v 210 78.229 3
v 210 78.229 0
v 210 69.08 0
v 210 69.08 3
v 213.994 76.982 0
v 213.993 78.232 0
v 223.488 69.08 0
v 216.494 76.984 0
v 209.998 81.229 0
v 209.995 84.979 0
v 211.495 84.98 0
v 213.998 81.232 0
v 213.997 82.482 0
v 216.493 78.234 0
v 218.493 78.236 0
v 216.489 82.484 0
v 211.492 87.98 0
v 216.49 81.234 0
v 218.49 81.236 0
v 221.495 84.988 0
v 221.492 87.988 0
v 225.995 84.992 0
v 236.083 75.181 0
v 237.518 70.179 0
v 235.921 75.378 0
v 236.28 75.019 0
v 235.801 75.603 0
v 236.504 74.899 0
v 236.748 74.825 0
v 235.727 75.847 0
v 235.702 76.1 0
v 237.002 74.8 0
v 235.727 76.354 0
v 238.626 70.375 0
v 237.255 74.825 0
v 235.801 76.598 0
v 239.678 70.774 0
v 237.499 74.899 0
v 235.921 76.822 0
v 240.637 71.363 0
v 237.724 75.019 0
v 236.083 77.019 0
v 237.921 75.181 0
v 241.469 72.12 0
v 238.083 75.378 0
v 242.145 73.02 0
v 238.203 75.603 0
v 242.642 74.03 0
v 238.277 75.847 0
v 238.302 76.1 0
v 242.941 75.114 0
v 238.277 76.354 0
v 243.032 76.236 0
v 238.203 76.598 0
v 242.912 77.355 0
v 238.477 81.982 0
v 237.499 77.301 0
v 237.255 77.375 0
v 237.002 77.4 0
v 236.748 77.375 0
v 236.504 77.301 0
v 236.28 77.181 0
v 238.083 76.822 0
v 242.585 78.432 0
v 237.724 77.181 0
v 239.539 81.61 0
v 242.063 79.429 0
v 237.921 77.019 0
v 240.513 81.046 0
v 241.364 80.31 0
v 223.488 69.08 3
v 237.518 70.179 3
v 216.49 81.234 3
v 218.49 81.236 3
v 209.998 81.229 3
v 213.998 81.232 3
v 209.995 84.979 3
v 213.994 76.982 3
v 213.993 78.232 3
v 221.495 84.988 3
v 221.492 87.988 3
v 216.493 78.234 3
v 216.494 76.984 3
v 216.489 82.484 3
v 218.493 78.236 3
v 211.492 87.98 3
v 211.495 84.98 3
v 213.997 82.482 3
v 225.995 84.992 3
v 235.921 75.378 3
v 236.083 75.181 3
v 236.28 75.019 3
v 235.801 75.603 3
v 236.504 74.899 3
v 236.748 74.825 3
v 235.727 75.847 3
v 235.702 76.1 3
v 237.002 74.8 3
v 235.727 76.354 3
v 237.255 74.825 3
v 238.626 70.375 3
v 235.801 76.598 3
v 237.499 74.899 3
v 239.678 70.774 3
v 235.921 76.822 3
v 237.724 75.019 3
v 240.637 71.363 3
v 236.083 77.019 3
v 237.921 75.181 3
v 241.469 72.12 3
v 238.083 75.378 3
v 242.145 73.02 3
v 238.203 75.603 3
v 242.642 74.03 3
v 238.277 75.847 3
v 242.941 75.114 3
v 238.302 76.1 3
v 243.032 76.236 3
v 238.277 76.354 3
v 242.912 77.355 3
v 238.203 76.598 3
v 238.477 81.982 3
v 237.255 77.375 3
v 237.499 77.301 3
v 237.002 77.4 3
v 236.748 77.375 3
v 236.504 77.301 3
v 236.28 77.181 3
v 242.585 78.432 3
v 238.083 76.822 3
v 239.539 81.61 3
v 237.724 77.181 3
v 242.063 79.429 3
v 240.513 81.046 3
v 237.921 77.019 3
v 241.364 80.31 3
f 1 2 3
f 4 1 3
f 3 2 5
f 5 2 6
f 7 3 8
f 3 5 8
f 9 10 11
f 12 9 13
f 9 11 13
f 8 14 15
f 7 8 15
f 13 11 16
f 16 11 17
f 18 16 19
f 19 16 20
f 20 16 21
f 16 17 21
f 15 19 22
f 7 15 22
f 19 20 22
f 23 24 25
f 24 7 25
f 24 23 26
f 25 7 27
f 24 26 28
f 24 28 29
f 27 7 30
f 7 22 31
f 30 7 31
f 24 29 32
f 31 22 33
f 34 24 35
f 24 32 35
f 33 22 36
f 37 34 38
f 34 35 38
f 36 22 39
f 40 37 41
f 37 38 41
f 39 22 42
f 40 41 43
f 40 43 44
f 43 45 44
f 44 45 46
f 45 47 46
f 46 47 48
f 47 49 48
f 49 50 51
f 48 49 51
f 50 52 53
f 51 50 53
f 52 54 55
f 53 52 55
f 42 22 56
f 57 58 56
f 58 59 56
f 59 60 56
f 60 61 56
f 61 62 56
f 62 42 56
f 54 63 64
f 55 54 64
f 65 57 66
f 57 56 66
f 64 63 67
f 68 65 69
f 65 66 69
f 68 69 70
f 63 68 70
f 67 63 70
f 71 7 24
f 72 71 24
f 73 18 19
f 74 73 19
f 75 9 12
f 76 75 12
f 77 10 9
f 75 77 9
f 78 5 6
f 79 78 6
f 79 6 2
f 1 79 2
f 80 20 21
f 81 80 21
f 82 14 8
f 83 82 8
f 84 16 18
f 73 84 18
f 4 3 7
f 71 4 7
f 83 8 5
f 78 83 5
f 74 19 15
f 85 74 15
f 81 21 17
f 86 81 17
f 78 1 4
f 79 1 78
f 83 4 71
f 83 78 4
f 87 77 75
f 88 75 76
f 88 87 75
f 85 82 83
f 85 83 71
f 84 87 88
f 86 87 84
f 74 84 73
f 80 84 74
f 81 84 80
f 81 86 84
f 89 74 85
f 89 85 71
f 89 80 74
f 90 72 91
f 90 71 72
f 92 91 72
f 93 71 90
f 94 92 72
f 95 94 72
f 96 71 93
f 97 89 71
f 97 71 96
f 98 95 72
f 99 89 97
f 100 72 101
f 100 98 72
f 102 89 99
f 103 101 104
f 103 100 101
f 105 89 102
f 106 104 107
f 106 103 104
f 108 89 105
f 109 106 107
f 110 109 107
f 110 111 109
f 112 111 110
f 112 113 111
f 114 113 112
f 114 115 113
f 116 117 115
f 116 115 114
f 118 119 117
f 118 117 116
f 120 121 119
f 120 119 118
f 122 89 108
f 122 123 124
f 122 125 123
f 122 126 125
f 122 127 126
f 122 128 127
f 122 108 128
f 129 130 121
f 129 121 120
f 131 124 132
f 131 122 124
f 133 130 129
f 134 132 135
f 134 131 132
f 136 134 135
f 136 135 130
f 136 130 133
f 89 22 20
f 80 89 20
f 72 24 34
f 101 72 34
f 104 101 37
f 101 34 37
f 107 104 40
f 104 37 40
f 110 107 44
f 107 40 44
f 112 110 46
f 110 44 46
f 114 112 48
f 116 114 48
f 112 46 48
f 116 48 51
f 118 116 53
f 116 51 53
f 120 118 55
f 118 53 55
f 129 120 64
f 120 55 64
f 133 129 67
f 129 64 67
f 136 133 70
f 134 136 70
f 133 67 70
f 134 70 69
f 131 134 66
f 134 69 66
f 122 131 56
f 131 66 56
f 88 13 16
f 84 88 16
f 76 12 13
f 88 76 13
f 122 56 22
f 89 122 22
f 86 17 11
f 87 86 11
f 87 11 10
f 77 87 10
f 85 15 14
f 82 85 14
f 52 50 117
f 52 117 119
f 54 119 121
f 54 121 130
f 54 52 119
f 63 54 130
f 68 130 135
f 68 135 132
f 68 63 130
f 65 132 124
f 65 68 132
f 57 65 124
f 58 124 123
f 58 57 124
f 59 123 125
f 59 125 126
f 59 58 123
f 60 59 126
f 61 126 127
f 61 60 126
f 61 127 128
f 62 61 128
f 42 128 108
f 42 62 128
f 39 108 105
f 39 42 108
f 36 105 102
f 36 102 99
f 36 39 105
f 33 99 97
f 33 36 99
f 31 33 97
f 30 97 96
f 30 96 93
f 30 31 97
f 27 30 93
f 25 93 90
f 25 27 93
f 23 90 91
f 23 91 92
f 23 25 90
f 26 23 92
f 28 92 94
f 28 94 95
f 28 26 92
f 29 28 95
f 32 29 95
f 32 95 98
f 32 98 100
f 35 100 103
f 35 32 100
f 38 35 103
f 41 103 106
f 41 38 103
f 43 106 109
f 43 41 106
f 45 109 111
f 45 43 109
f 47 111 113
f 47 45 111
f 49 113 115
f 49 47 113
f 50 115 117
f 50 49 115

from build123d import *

# Parameters (mm, degrees)
SKETCH_1_R      = 1.3
EXTRUDE_1_DEPTH = 3


with BuildPart() as part:
    # 草圖1 → 填料-伸長1 (new body)
    with BuildSketch(Plane.XY):
        with BuildLine():
            Line((216.492632944, 78.234092132), (216.493617135, 76.984092519))
            Line((216.493617135, 76.984092519), (213.99361791, 76.982124137))
            Line((213.99361791, 76.982124137), (213.992633719, 78.23212375))
            Line((213.992633719, 78.23212375), (210.000112684, 78.228980226))
            Line((210.000112684, 78.228980226), (209.999867004, 69.08))
            Line((209.999867004, 69.08), (223.48824264, 69.08))
            Line((223.48824264, 69.08), (237.517934203, 70.178792238))
            ThreePointArc((237.517934203, 70.178792238), (243.012429177, 75.673064936), (238.477244304, 81.982471062))
            Line((238.477244304, 81.982471062), (225.994777469, 84.991510945))
            Line((225.994777469, 84.991510945), (221.494778864, 84.987967857))
            Line((221.494778864, 84.987967857), (221.492416806, 87.987966928))
            Line((221.492416806, 87.987966928), (211.492419905, 87.980093399))
            Line((211.492419905, 87.980093399), (211.494781964, 84.980094329))
            Line((211.494781964, 84.980094329), (209.994782429, 84.9789133))
            Line((209.994782429, 84.9789133), (209.997745798, 81.228979292))
            Line((209.997745798, 81.228979292), (213.997733688, 81.232128695))
            Line((213.997733688, 81.232128695), (213.996749497, 82.482128308))
            Line((213.996749497, 82.482128308), (216.489286694, 82.484090815))
            Line((216.489286694, 82.484090815), (216.490270885, 81.234091202))
            Line((216.490270885, 81.234091202), (218.490270265, 81.235665908))
            Line((218.490270265, 81.235665908), (218.492632324, 78.235666838))
            Line((218.492632324, 78.235666838), (216.492632944, 78.234092132))
        make_face()
        with Locations((237.0017815, 76.100174585)):
            Circle(SKETCH_1_R, mode=Mode.SUBTRACT)
    extrude(amount=EXTRUDE_1_DEPTH)


solid = part.part
